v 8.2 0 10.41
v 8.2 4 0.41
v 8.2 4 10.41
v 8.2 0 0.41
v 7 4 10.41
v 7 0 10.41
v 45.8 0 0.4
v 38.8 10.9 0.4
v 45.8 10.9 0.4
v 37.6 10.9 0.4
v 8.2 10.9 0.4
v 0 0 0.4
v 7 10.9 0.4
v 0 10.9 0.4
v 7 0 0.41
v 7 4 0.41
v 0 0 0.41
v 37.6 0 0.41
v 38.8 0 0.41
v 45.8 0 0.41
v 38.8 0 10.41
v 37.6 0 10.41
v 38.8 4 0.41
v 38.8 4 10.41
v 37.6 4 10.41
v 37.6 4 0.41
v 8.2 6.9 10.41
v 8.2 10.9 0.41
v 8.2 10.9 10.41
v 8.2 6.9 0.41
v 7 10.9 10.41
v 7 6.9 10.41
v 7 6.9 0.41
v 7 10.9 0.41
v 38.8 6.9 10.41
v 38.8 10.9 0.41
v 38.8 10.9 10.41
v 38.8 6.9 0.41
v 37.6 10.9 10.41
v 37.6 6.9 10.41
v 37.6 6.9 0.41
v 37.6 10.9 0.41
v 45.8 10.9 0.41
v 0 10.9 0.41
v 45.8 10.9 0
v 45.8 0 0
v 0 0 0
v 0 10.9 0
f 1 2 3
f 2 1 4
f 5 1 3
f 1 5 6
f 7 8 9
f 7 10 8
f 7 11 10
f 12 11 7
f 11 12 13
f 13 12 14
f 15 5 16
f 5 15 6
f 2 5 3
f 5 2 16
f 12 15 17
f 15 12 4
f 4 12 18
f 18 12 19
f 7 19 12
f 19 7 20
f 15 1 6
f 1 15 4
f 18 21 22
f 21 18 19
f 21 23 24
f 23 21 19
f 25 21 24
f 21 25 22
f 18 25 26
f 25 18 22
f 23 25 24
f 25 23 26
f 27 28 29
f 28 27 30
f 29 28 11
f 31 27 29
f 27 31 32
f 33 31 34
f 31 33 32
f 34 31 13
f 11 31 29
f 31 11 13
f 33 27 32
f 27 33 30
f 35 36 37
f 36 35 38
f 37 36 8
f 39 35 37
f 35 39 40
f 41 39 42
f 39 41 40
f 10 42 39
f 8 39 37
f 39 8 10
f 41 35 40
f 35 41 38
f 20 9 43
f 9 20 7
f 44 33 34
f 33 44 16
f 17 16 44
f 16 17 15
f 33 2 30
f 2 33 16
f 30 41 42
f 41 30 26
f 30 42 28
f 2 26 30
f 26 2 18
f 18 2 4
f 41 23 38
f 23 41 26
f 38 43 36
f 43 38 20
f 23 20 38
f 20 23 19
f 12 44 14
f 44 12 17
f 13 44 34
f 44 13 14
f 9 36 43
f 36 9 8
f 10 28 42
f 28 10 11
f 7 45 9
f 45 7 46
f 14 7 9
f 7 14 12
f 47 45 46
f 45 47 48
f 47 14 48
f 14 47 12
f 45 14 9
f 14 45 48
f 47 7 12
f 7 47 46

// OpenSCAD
// file: ../../Base/Rotation.scad
// Fischertechnik Box Foundation
// Geometry Helpers Rotation

include <PlacementOptions.scad>

// getRotatedSpace(space, rotation=NoRotation)
// Rotates the space dependent on the specified rotation

function getRotatedSpace(space, rotation=NoRotation) = [
    (rotation == Rotate90 || rotation == Rotate270) ? space.y : space.x,
    (rotation == Rotate90 || rotation == Rotate270) ? space.x : space.y
];

// Rotates the given space around the fixed left lower corner
// space = the space the children needs as width/depth list [width,depth]
// rotation = 0 Rotate0 degrees, 1 Rotate90 degrees, 2 Rotate180 degrees, 3 Rotate270 degrees (equivalent to -90)

module RotateFix(space, rotation=NoRotation) {
    dy = (rotation == Rotate0 || rotation == Rotate270) ? 0 :
        (rotation == Rotate90) ? space.x :
        space.y;
    dx = (rotation < Rotate180) ? 0 :
        (rotation == Rotate180) ? space.x :
        space.y;
    
    translate([dx, dy, 0])
        rotate([0, 0, rotations[rotation]])
            children();
}
// file: ../../Base/Alignment.scad
// Fischertechnik Box Foundation
// Geometry Helpers Alignment

include <PlacementOptions.scad>

// getAlignedX(elementWidth, spaceWidth, align=AlignRight, offset=0)
// Gets the aligned X offset of an element with the given
// width in the given space.
// elementWidth = The width of the element to positon
// spaceWidth = The space where the element should be aligned
// align = 0 AlignLeft, 1 AlignCenter, 2 AlignRight
// offset = an optional offset from the aligned position. When
// aligned left or centered, then positive values are in X direction.
// When aligned right then positive values are in negative X direction.

function getAlignedX(elementWidth, spaceWidth, align=AlignRight, offset=0) =
    (align == AlignLeft) ?
        offset :
        ((align == AlignCenter) ?
        (spaceWidth - elementWidth)/2 + offset :
        spaceWidth - offset - elementWidth);

// getAlignedY(elementDepth, spaceDepth, align=AlignTop, offset=0)
// Gets the aligned Y offset of an element with the given
// depth in the given space.
// elementDepth = The depth of the element to positon
// spaceDepth = The space where the element should be aligned
// align = 0 AlignBottom, 1 AlignCenter, 2 AlignTop
// offset = an optional offset from the aligned position. When
// aligned bottom or centered, then positive values are in Y direction.
// When aligned top then positive values are in negative Y direction.

function getAlignedY(elementDepth, spaceDepth, align=AlignTop, offset=0) =
    (align == AlignBottom) ?
        offset :
        ((align == AlignCenter) ?
        (spaceDepth - elementDepth)/2 + offset :
        spaceDepth - offset - elementDepth);
// file: ../../Base/Boxes.scad
// Fischertechnik Box Foundation
// Pre-designed Boxes

use <Constants.scad>

include <PlacementOptions.scad>

box190Width = 190;
box190Depth = 130;
box130Width = 130;
box130Depth = 95;

// Values are from an original ec3 box
topBottomDifference = 1.5;
outerHeight = 40;
innerHeight = 38.2;
baseThickness = outerHeight - innerHeight;
stackExcess = 5.7;
radius = 3.5;
wallThickness = 1.5;
tolerance = 0.2;
stackOffset = innerHeight - stackExcess;

boxUsageHeight = stackOffset;
boxWallThickness = wallThickness;
boxBaseThickness = baseThickness;
boxWebWidth = 3.0;

// getBoxWallThickness()
// Gets the wall thickness of a Fischertechnik Box
function getBoxWallThickness() = boxWallThickness;

// getBoxUsageHeight()
// Gets the usable height of a Fischertechnik box
function getBoxUsageHeight() = boxUsageHeight;

// getBoxInnerHeight()
// Gets the inner height of a Fischertechnik box, including the stack excess
function getBoxInnerHeight() = innerHeight;

// getBoxBaseThickness()
// Gets the thickness of the Fischertechnik box base.
function getBoxBaseThickness() = boxBaseThickness;

// getBoxWebWidth()
// Gets the width of a box web
function getBoxWebWidth() = boxWebWidth;

// getBox190Space()
// Gets the usable inner space of a Box 190 as an x/y-list
function getBox190Space() = [
    box190Width - 2*getBoxWallThickness() - topBottomDifference, 
    box190Depth - 2*getBoxWallThickness() - topBottomDifference ];

// BoxBase(width, depth)
// Creates an empty stackable Fischertechnik compatible box
// width = Outer width of the box (190, 130, ...)
// depth = Outer depth of the box (130, 95, ...)

module BoxBase(width, depth, height=outerHeight) {    
    thinPlate = 0.01;

    innerHeight = height - baseThickness;    
    
    module BodyPlate(width, depth) {
        translate([radius, radius])
        hull() {
            w = width-2*radius;
            d = depth-2*radius;
            cube([w, d, thinPlate]);
            cylinder(thinPlate, r=radius, $fn=getFragments());
            translate([w, 0])
                cylinder(thinPlate, r=radius, $fn=getFragments());
            translate([w, d])
                cylinder(thinPlate, r=radius, $fn=getFragments());
            translate([0, d])
                cylinder(thinPlate, r=radius, $fn=getFragments());
        }
    }
    
    module Body(tolerance=tolerance) {
        hull() {
            // Bottom with tolerance to fit into the original boxes when stacked
            translate([-wallThickness+tolerance, -wallThickness+tolerance, -baseThickness])
                BodyPlate(width-topBottomDifference-2*tolerance, depth-topBottomDifference-2*tolerance);
            
            // Top
            translate([-wallThickness-topBottomDifference/2, -wallThickness-topBottomDifference/2, innerHeight-thinPlate])
                BodyPlate(width, depth);
         }
    }

    module Cutoff() {
        hull() {
            coWidth = width - 2*wallThickness;
            coDepth = depth - 2*wallThickness;
            
            // Bottom
            BodyPlate(coWidth-topBottomDifference, coDepth-topBottomDifference);

            // Top
            translate([-topBottomDifference/2, -topBottomDifference/2, innerHeight+thinPlate]) 
                BodyPlate(coWidth, coDepth);
        }
    }
    
    difference() {        
        Body();
        Cutoff();
        stackOffset = innerHeight - stackExcess;
        translate([0, 0, stackOffset + baseThickness])
            Body(tolerance=0);
    }
}

// Creates the Fischertechnik empty box 130x190 mm and places it at position 0,0
// 190x130 are the outer sizes, the inner space is slightly smaller. Use getBox190Space() to get the inner sizes.
// The box is positioned that the usable inner space is at the 0,0,0 position. The

module Box190() {
    BoxBase(box190Width, box190Depth);
}

// Gets the usable inner space of a Box 130 as an x/y-list
function getBox130Space() = [
    box130Width - 2*getBoxWallThickness() - topBottomDifference, 
    box130Depth - 2*getBoxWallThickness() - topBottomDifference ];

// Creates the Fischertechnik empty box 95x130 mm and places it at position 0,0
// 190x130 are the outer sizes, the inner space is slightly smaller. Use getBox190Space() to get the inner sizes.
// The box is positioned that the usable inner space is at the 0,0,0 position. The

module Box130() {
    BoxBase(box130Width, box130Depth);
}

// Creates a web at the specified box walls
// corner 0 = LowerLeft, 1 = UpperLeft, 2 = UpperRight, 3 = LowerRight
// side 0 = LeftOfCorner, 1 = RightOfCorner
// distance = Distance in mm from the corner
// boxSpace = inner width and depth of the box (default: Box 190)
// webWidth = length of the web (default is 3 mms)
// webThickness = thickness of the web (default is 1 mm)

module BoxWeb(corner, side, distance, boxSpace=getBox190Space(), webWidth=getBoxWebWidth(), webThickness=1.0) {
    sink = getBoxWallThickness()/2;

    width = (corner % 2 == 0) ? 
            (side == LeftOfCorner ? webWidth : webThickness) :
            (side == LeftOfCorner ? webThickness : webWidth);

    depth = (corner % 2 == 0) ? 
            (side == RightOfCorner ? webWidth : webThickness) :
            (side == RightOfCorner ? webThickness : webWidth);
    
    xDiff = corner == LowerLeft ? 
                (side == LeftOfCorner ? -sink : distance) :
            (corner == UpperLeft ?                
                (side == LeftOfCorner ? distance : -sink) :
            (corner == UpperRight ?
                (side == LeftOfCorner ? boxSpace.x-webWidth+sink : boxSpace.x-distance-webThickness) :
                (side == LeftOfCorner ? boxSpace.x-distance-webThickness: boxSpace.x-webWidth+sink)));

    yDiff = corner == LowerLeft ? 
                (side == RightOfCorner ? -sink : distance) :
            (corner == UpperLeft ?
                (side == RightOfCorner ? boxSpace.y-distance : boxSpace.y-webWidth+sink) :
            (corner == UpperRight ?
                (side == RightOfCorner ? boxSpace.y-webWidth+sink : boxSpace.y-distance) :
                (side == RightOfCorner ? distance : -sink)));
    
    translate([xDiff, yDiff, -getExcess()])
        cube([width, depth, boxUsageHeight + 2*getExcess()]);
}
// file: ../../Base/PlacementOptions.scad
// Fischertechnik Box Foundation
// Placement Options

// Alignment
NoAlign = 0;
AlignLeft = 1;
AlignBottom = 2;
AlignCenter = 3;
AlignRight = 4;
AlignTop = 5;

// Element rotation degree steps
rotations = [0, -90, -180, -270];

// Rotation
NoRotation = 0;
Rotate0 = 0;
Rotate90 = 1;
Rotate180 = 2;
Rotate270 = 3;

// Docking (seen from above)
NoDock = -1;
DockLeft = 0;
DockTop = 1;
DockRight = 2;
DockCorner = 2;
DockBottom = 3;

// Web corners
LowerLeft = 0;
UpperLeft = 1;
UpperRight = 2;
LowerRight = 3;

// Web position relative to corner
LeftOfCorner = 0;
RightOfCorner = 1;
// file: ../../Base/Placement.scad
// Fischertechnik Box Foundation
// Geometry Helpers Placement

use <Constants.scad>
use <Alignment.scad>
use <Rotation.scad>
use <Boxes.scad>

include <PlacementOptions.scad>

// Place(x=0, y=0, elementSpace=[0,0], alignX=AlignLeft, alignY=AlignBottom, rotation=Rotate0, boxSpace=getBox190Space())
// Places the child at the specified position
// y = Y-Position. This is a relative position when an X aligment is specified.
// x = X-Position. This is a relative position when an Y aligment is specified.
// elementSpace = space of the element to be placed [x,y]
// alignX = -1=NoAlign, 0 AlignLeft, 1 AlignCenter, 3 AlignRight (elementSpace and boxSpace required!)
// alignY = -1=NoAlign, 2 AlignBottom, 1 AlignCenter, 4 AlignTop (elementSpace and boxSpace required!)
// rotation = 0 Rotate0 0 degrees, 1 Rotate90 90 degrees, 
// 2 Rotate180 180 degrees, 3 Rotate270 270 degrees (equivalent to -90)
// boxSpace = Inner space of the box where the placement occurs [x,y] - default is Box 190x130 inner space

module Place(x=0, y=0, elementSpace=[0,0], 
  alignX=AlignLeft, alignY=AlignBottom, 
  rotation=NoRotation, boxSpace=getBox190Space()) {

    module Position(x, y, space, rotation=Rotate0) {
        translate([x, y, 0])
            RotateFix(space, rotation)
                children();
    }

    space = getRotatedSpace(elementSpace, rotation);
    alignedX = getAlignedX(space.x, boxSpace.x, alignX, x);
    alignedY = getAlignedY(space.y, boxSpace.y, alignY, y);
    Position(alignedX, alignedY, elementSpace, rotation)
        children();
}

// Center(space=getBox130Space(), elementSpace=[0,0])
// space = Space where the children is centered. For cylinder use centered=true and no elementSpace.
// elementSpace = space of the element to be centered [x,y]

module Center(space=getBox190Space(), elementSpace=[0,0]) {
    Place(elementSpace=elementSpace, boxSpace=space, alignX=AlignCenter, alignY=AlignCenter)
        children();
}

// CenterHorizontal(width=0, y=0, offset=0, space=getBox130Space())
// width = Width of the element to be placed.
// y = Y position of the element
// offset = Offset from the center position (negative will be left of the center)
// space = Space where the element is placed

module CenterHorizontal(width=0, y=0, offset=0, space=getBox190Space()) {
    Place(x=offset, y=y, elementSpace=[width, 0], boxSpace=space, alignX=AlignCenter)
        children(0);
}

// CenterVertical(depth=0, x=0, offset=0, space=getBox130Space())
// depth = Depth of the element to be placed.
// x = X position of the element
// offset = Offset from the center position (negative will be down of the center)
// space = Space where the element is placed

module CenterVertical(depth=0, x=0, offset=0, space=getBox190Space()) {
    Place(x=x, y=offset, elementSpace=[0, depth], boxSpace=space, alignY=AlignCenter)
        children(0);
}

// getIsVertical(align)
// True if the specified alignment needs a vertical orientation for a divider (AlignRight, AlignLeft)

function getIsVertical(align) = (align == AlignRight || align == AlignLeft);

// getIsHorizontal(align)
// True if the specified alignment needs a horizontal orientation for a divider (AlignTop, AlignBottom)

function getIsHorizontal(align) = (align == AlignTop || align == AlignBottom);
// file: ../../Elements/AxisClip10.scad
// Fischertechnik Box Library
// Axis for clip 10
// 31023

use <../ModelBase/Simple.scad>
use <../Base/Constants.scad>

width = 12;
depth = 12;
height = 23;
upperDiameter = 3.6;
clipHeight = 10;

// getAxisClip10Space()
// Gets the space of a frame for a clip 10 with spring ring (mot2)

function getAxisClip10Space() = [width, depth, height];

// AxisClip10(height, clipHeight)
// Axis for clip 10 with spring ring (mot2)
// height = Height of the complete axis
// clipHeight = Height of the rt for the clip (standard is 10, in mot3 its only 7)

module AxisClip10(height=height, clipHeight=clipHeight) {
    LeveledAxisWithSpace(height, height-clipHeight, getAxisClip10Space(), diameter=upperDiameter);
}

// Tests
color("lightgray")
AxisClip10();
// file: ../../Base/Constants.scad
// Fischertechnik Box Foundation
// Constants

// Constant values necessary for multiple elements

// Base constants
dividerThickness = 1.2;
excess = 0.01;
fragments = 90;
tolerance = 0.8;

// Gets the thickness of a divider 
function getDividerThickness() = dividerThickness;

// Gets the excess that is used to merge walls into each other
function getExcess() = excess;

// Gets amount of fragments of a cylinder
function getFragments() = fragments;

// Gets the inner tolerance of a frame to each side
function getTolerance() = tolerance;


// Fischertechnik specific constants
axisDiameter = 4;
axisBottomDiameter = axisDiameter + 1;
standardEdgeDistance = 2.5;
standardWebDistance = 11.5;
standardCornerLength = 15;
tubeWallFactor = 0.8;
smallPartsFrameHeight = 20;

// Gets axis diameter
function getAxisDiameter() = axisDiameter;

// Gets axis bottom diameter for thicker part at the bottom
function getAxisBottomDiameter() = axisBottomDiameter;

// gets the standard distance to the wall of the box for dockable frames with webs
function getStandardEdgeDistance() = standardEdgeDistance;

// gets the standard distance of each web to the corner of the dockable frame
function getStandardWebDistance() = standardWebDistance;

// gets the standard length of the corner walls of a dockable frame
function getStandardCornerLength() = standardCornerLength;

// gets the wall thickness of a tube.
function getTubeWallThickness() = tubeWallFactor * getDividerThickness();

// gets the frame height for docked small parts boxes.
function getSmallPartsFrameHeight() = smallPartsFrameHeight;
// file: ../../Elements/HolderBuildingPlate30x45.scad
// Fischertechnik Box Library
// Holder for Building Plate 30x45
// 38259

use <../ModelBase/Complex.scad>

width = 45;

// getHolderBuildingPlate30x45Space(count = 1)
// Gets the width (.x) and depth (.y) space the holder needs.

function getHolderBuildingPlate30x45Space(count = 1) = getHolderBuildingPlateSpace(width, count);

// HolderBuildingPlate30x45(count=1, dock=false)
// Holder for building plates 45x30
// count = Count of building plates (default 1)
// dock = true if the holders are docked to the box wall (default false) 

module HolderBuildingPlate30x45(count = 1, dock = false) {
    HolderBuildingPlate(width, count, dock);
}

// Test
color("lightgray")
HolderBuildingPlate30x45();
// file: ../TestPrint.scad
// 3D Print Test Base

use <../Base/Constants.scad>

use <../Elements/AxisClip10.scad>

module TestPrint(elementSpace) {
    cube([elementSpace.x, elementSpace.y, 0.4]);
    translate([0,0,0.4+getExcess()]) {
        children();
    }
}

TestPrint(getAxisClip10Space())
    AxisClip10();
// main file
// 3D Print Test
// HolderBuildingPlate30x45

use <../TestPrint.scad>
use <../../Elements/HolderBuildingPlate30x45.scad>

TestPrint(getHolderBuildingPlate30x45Space())
    HolderBuildingPlate30x45();
